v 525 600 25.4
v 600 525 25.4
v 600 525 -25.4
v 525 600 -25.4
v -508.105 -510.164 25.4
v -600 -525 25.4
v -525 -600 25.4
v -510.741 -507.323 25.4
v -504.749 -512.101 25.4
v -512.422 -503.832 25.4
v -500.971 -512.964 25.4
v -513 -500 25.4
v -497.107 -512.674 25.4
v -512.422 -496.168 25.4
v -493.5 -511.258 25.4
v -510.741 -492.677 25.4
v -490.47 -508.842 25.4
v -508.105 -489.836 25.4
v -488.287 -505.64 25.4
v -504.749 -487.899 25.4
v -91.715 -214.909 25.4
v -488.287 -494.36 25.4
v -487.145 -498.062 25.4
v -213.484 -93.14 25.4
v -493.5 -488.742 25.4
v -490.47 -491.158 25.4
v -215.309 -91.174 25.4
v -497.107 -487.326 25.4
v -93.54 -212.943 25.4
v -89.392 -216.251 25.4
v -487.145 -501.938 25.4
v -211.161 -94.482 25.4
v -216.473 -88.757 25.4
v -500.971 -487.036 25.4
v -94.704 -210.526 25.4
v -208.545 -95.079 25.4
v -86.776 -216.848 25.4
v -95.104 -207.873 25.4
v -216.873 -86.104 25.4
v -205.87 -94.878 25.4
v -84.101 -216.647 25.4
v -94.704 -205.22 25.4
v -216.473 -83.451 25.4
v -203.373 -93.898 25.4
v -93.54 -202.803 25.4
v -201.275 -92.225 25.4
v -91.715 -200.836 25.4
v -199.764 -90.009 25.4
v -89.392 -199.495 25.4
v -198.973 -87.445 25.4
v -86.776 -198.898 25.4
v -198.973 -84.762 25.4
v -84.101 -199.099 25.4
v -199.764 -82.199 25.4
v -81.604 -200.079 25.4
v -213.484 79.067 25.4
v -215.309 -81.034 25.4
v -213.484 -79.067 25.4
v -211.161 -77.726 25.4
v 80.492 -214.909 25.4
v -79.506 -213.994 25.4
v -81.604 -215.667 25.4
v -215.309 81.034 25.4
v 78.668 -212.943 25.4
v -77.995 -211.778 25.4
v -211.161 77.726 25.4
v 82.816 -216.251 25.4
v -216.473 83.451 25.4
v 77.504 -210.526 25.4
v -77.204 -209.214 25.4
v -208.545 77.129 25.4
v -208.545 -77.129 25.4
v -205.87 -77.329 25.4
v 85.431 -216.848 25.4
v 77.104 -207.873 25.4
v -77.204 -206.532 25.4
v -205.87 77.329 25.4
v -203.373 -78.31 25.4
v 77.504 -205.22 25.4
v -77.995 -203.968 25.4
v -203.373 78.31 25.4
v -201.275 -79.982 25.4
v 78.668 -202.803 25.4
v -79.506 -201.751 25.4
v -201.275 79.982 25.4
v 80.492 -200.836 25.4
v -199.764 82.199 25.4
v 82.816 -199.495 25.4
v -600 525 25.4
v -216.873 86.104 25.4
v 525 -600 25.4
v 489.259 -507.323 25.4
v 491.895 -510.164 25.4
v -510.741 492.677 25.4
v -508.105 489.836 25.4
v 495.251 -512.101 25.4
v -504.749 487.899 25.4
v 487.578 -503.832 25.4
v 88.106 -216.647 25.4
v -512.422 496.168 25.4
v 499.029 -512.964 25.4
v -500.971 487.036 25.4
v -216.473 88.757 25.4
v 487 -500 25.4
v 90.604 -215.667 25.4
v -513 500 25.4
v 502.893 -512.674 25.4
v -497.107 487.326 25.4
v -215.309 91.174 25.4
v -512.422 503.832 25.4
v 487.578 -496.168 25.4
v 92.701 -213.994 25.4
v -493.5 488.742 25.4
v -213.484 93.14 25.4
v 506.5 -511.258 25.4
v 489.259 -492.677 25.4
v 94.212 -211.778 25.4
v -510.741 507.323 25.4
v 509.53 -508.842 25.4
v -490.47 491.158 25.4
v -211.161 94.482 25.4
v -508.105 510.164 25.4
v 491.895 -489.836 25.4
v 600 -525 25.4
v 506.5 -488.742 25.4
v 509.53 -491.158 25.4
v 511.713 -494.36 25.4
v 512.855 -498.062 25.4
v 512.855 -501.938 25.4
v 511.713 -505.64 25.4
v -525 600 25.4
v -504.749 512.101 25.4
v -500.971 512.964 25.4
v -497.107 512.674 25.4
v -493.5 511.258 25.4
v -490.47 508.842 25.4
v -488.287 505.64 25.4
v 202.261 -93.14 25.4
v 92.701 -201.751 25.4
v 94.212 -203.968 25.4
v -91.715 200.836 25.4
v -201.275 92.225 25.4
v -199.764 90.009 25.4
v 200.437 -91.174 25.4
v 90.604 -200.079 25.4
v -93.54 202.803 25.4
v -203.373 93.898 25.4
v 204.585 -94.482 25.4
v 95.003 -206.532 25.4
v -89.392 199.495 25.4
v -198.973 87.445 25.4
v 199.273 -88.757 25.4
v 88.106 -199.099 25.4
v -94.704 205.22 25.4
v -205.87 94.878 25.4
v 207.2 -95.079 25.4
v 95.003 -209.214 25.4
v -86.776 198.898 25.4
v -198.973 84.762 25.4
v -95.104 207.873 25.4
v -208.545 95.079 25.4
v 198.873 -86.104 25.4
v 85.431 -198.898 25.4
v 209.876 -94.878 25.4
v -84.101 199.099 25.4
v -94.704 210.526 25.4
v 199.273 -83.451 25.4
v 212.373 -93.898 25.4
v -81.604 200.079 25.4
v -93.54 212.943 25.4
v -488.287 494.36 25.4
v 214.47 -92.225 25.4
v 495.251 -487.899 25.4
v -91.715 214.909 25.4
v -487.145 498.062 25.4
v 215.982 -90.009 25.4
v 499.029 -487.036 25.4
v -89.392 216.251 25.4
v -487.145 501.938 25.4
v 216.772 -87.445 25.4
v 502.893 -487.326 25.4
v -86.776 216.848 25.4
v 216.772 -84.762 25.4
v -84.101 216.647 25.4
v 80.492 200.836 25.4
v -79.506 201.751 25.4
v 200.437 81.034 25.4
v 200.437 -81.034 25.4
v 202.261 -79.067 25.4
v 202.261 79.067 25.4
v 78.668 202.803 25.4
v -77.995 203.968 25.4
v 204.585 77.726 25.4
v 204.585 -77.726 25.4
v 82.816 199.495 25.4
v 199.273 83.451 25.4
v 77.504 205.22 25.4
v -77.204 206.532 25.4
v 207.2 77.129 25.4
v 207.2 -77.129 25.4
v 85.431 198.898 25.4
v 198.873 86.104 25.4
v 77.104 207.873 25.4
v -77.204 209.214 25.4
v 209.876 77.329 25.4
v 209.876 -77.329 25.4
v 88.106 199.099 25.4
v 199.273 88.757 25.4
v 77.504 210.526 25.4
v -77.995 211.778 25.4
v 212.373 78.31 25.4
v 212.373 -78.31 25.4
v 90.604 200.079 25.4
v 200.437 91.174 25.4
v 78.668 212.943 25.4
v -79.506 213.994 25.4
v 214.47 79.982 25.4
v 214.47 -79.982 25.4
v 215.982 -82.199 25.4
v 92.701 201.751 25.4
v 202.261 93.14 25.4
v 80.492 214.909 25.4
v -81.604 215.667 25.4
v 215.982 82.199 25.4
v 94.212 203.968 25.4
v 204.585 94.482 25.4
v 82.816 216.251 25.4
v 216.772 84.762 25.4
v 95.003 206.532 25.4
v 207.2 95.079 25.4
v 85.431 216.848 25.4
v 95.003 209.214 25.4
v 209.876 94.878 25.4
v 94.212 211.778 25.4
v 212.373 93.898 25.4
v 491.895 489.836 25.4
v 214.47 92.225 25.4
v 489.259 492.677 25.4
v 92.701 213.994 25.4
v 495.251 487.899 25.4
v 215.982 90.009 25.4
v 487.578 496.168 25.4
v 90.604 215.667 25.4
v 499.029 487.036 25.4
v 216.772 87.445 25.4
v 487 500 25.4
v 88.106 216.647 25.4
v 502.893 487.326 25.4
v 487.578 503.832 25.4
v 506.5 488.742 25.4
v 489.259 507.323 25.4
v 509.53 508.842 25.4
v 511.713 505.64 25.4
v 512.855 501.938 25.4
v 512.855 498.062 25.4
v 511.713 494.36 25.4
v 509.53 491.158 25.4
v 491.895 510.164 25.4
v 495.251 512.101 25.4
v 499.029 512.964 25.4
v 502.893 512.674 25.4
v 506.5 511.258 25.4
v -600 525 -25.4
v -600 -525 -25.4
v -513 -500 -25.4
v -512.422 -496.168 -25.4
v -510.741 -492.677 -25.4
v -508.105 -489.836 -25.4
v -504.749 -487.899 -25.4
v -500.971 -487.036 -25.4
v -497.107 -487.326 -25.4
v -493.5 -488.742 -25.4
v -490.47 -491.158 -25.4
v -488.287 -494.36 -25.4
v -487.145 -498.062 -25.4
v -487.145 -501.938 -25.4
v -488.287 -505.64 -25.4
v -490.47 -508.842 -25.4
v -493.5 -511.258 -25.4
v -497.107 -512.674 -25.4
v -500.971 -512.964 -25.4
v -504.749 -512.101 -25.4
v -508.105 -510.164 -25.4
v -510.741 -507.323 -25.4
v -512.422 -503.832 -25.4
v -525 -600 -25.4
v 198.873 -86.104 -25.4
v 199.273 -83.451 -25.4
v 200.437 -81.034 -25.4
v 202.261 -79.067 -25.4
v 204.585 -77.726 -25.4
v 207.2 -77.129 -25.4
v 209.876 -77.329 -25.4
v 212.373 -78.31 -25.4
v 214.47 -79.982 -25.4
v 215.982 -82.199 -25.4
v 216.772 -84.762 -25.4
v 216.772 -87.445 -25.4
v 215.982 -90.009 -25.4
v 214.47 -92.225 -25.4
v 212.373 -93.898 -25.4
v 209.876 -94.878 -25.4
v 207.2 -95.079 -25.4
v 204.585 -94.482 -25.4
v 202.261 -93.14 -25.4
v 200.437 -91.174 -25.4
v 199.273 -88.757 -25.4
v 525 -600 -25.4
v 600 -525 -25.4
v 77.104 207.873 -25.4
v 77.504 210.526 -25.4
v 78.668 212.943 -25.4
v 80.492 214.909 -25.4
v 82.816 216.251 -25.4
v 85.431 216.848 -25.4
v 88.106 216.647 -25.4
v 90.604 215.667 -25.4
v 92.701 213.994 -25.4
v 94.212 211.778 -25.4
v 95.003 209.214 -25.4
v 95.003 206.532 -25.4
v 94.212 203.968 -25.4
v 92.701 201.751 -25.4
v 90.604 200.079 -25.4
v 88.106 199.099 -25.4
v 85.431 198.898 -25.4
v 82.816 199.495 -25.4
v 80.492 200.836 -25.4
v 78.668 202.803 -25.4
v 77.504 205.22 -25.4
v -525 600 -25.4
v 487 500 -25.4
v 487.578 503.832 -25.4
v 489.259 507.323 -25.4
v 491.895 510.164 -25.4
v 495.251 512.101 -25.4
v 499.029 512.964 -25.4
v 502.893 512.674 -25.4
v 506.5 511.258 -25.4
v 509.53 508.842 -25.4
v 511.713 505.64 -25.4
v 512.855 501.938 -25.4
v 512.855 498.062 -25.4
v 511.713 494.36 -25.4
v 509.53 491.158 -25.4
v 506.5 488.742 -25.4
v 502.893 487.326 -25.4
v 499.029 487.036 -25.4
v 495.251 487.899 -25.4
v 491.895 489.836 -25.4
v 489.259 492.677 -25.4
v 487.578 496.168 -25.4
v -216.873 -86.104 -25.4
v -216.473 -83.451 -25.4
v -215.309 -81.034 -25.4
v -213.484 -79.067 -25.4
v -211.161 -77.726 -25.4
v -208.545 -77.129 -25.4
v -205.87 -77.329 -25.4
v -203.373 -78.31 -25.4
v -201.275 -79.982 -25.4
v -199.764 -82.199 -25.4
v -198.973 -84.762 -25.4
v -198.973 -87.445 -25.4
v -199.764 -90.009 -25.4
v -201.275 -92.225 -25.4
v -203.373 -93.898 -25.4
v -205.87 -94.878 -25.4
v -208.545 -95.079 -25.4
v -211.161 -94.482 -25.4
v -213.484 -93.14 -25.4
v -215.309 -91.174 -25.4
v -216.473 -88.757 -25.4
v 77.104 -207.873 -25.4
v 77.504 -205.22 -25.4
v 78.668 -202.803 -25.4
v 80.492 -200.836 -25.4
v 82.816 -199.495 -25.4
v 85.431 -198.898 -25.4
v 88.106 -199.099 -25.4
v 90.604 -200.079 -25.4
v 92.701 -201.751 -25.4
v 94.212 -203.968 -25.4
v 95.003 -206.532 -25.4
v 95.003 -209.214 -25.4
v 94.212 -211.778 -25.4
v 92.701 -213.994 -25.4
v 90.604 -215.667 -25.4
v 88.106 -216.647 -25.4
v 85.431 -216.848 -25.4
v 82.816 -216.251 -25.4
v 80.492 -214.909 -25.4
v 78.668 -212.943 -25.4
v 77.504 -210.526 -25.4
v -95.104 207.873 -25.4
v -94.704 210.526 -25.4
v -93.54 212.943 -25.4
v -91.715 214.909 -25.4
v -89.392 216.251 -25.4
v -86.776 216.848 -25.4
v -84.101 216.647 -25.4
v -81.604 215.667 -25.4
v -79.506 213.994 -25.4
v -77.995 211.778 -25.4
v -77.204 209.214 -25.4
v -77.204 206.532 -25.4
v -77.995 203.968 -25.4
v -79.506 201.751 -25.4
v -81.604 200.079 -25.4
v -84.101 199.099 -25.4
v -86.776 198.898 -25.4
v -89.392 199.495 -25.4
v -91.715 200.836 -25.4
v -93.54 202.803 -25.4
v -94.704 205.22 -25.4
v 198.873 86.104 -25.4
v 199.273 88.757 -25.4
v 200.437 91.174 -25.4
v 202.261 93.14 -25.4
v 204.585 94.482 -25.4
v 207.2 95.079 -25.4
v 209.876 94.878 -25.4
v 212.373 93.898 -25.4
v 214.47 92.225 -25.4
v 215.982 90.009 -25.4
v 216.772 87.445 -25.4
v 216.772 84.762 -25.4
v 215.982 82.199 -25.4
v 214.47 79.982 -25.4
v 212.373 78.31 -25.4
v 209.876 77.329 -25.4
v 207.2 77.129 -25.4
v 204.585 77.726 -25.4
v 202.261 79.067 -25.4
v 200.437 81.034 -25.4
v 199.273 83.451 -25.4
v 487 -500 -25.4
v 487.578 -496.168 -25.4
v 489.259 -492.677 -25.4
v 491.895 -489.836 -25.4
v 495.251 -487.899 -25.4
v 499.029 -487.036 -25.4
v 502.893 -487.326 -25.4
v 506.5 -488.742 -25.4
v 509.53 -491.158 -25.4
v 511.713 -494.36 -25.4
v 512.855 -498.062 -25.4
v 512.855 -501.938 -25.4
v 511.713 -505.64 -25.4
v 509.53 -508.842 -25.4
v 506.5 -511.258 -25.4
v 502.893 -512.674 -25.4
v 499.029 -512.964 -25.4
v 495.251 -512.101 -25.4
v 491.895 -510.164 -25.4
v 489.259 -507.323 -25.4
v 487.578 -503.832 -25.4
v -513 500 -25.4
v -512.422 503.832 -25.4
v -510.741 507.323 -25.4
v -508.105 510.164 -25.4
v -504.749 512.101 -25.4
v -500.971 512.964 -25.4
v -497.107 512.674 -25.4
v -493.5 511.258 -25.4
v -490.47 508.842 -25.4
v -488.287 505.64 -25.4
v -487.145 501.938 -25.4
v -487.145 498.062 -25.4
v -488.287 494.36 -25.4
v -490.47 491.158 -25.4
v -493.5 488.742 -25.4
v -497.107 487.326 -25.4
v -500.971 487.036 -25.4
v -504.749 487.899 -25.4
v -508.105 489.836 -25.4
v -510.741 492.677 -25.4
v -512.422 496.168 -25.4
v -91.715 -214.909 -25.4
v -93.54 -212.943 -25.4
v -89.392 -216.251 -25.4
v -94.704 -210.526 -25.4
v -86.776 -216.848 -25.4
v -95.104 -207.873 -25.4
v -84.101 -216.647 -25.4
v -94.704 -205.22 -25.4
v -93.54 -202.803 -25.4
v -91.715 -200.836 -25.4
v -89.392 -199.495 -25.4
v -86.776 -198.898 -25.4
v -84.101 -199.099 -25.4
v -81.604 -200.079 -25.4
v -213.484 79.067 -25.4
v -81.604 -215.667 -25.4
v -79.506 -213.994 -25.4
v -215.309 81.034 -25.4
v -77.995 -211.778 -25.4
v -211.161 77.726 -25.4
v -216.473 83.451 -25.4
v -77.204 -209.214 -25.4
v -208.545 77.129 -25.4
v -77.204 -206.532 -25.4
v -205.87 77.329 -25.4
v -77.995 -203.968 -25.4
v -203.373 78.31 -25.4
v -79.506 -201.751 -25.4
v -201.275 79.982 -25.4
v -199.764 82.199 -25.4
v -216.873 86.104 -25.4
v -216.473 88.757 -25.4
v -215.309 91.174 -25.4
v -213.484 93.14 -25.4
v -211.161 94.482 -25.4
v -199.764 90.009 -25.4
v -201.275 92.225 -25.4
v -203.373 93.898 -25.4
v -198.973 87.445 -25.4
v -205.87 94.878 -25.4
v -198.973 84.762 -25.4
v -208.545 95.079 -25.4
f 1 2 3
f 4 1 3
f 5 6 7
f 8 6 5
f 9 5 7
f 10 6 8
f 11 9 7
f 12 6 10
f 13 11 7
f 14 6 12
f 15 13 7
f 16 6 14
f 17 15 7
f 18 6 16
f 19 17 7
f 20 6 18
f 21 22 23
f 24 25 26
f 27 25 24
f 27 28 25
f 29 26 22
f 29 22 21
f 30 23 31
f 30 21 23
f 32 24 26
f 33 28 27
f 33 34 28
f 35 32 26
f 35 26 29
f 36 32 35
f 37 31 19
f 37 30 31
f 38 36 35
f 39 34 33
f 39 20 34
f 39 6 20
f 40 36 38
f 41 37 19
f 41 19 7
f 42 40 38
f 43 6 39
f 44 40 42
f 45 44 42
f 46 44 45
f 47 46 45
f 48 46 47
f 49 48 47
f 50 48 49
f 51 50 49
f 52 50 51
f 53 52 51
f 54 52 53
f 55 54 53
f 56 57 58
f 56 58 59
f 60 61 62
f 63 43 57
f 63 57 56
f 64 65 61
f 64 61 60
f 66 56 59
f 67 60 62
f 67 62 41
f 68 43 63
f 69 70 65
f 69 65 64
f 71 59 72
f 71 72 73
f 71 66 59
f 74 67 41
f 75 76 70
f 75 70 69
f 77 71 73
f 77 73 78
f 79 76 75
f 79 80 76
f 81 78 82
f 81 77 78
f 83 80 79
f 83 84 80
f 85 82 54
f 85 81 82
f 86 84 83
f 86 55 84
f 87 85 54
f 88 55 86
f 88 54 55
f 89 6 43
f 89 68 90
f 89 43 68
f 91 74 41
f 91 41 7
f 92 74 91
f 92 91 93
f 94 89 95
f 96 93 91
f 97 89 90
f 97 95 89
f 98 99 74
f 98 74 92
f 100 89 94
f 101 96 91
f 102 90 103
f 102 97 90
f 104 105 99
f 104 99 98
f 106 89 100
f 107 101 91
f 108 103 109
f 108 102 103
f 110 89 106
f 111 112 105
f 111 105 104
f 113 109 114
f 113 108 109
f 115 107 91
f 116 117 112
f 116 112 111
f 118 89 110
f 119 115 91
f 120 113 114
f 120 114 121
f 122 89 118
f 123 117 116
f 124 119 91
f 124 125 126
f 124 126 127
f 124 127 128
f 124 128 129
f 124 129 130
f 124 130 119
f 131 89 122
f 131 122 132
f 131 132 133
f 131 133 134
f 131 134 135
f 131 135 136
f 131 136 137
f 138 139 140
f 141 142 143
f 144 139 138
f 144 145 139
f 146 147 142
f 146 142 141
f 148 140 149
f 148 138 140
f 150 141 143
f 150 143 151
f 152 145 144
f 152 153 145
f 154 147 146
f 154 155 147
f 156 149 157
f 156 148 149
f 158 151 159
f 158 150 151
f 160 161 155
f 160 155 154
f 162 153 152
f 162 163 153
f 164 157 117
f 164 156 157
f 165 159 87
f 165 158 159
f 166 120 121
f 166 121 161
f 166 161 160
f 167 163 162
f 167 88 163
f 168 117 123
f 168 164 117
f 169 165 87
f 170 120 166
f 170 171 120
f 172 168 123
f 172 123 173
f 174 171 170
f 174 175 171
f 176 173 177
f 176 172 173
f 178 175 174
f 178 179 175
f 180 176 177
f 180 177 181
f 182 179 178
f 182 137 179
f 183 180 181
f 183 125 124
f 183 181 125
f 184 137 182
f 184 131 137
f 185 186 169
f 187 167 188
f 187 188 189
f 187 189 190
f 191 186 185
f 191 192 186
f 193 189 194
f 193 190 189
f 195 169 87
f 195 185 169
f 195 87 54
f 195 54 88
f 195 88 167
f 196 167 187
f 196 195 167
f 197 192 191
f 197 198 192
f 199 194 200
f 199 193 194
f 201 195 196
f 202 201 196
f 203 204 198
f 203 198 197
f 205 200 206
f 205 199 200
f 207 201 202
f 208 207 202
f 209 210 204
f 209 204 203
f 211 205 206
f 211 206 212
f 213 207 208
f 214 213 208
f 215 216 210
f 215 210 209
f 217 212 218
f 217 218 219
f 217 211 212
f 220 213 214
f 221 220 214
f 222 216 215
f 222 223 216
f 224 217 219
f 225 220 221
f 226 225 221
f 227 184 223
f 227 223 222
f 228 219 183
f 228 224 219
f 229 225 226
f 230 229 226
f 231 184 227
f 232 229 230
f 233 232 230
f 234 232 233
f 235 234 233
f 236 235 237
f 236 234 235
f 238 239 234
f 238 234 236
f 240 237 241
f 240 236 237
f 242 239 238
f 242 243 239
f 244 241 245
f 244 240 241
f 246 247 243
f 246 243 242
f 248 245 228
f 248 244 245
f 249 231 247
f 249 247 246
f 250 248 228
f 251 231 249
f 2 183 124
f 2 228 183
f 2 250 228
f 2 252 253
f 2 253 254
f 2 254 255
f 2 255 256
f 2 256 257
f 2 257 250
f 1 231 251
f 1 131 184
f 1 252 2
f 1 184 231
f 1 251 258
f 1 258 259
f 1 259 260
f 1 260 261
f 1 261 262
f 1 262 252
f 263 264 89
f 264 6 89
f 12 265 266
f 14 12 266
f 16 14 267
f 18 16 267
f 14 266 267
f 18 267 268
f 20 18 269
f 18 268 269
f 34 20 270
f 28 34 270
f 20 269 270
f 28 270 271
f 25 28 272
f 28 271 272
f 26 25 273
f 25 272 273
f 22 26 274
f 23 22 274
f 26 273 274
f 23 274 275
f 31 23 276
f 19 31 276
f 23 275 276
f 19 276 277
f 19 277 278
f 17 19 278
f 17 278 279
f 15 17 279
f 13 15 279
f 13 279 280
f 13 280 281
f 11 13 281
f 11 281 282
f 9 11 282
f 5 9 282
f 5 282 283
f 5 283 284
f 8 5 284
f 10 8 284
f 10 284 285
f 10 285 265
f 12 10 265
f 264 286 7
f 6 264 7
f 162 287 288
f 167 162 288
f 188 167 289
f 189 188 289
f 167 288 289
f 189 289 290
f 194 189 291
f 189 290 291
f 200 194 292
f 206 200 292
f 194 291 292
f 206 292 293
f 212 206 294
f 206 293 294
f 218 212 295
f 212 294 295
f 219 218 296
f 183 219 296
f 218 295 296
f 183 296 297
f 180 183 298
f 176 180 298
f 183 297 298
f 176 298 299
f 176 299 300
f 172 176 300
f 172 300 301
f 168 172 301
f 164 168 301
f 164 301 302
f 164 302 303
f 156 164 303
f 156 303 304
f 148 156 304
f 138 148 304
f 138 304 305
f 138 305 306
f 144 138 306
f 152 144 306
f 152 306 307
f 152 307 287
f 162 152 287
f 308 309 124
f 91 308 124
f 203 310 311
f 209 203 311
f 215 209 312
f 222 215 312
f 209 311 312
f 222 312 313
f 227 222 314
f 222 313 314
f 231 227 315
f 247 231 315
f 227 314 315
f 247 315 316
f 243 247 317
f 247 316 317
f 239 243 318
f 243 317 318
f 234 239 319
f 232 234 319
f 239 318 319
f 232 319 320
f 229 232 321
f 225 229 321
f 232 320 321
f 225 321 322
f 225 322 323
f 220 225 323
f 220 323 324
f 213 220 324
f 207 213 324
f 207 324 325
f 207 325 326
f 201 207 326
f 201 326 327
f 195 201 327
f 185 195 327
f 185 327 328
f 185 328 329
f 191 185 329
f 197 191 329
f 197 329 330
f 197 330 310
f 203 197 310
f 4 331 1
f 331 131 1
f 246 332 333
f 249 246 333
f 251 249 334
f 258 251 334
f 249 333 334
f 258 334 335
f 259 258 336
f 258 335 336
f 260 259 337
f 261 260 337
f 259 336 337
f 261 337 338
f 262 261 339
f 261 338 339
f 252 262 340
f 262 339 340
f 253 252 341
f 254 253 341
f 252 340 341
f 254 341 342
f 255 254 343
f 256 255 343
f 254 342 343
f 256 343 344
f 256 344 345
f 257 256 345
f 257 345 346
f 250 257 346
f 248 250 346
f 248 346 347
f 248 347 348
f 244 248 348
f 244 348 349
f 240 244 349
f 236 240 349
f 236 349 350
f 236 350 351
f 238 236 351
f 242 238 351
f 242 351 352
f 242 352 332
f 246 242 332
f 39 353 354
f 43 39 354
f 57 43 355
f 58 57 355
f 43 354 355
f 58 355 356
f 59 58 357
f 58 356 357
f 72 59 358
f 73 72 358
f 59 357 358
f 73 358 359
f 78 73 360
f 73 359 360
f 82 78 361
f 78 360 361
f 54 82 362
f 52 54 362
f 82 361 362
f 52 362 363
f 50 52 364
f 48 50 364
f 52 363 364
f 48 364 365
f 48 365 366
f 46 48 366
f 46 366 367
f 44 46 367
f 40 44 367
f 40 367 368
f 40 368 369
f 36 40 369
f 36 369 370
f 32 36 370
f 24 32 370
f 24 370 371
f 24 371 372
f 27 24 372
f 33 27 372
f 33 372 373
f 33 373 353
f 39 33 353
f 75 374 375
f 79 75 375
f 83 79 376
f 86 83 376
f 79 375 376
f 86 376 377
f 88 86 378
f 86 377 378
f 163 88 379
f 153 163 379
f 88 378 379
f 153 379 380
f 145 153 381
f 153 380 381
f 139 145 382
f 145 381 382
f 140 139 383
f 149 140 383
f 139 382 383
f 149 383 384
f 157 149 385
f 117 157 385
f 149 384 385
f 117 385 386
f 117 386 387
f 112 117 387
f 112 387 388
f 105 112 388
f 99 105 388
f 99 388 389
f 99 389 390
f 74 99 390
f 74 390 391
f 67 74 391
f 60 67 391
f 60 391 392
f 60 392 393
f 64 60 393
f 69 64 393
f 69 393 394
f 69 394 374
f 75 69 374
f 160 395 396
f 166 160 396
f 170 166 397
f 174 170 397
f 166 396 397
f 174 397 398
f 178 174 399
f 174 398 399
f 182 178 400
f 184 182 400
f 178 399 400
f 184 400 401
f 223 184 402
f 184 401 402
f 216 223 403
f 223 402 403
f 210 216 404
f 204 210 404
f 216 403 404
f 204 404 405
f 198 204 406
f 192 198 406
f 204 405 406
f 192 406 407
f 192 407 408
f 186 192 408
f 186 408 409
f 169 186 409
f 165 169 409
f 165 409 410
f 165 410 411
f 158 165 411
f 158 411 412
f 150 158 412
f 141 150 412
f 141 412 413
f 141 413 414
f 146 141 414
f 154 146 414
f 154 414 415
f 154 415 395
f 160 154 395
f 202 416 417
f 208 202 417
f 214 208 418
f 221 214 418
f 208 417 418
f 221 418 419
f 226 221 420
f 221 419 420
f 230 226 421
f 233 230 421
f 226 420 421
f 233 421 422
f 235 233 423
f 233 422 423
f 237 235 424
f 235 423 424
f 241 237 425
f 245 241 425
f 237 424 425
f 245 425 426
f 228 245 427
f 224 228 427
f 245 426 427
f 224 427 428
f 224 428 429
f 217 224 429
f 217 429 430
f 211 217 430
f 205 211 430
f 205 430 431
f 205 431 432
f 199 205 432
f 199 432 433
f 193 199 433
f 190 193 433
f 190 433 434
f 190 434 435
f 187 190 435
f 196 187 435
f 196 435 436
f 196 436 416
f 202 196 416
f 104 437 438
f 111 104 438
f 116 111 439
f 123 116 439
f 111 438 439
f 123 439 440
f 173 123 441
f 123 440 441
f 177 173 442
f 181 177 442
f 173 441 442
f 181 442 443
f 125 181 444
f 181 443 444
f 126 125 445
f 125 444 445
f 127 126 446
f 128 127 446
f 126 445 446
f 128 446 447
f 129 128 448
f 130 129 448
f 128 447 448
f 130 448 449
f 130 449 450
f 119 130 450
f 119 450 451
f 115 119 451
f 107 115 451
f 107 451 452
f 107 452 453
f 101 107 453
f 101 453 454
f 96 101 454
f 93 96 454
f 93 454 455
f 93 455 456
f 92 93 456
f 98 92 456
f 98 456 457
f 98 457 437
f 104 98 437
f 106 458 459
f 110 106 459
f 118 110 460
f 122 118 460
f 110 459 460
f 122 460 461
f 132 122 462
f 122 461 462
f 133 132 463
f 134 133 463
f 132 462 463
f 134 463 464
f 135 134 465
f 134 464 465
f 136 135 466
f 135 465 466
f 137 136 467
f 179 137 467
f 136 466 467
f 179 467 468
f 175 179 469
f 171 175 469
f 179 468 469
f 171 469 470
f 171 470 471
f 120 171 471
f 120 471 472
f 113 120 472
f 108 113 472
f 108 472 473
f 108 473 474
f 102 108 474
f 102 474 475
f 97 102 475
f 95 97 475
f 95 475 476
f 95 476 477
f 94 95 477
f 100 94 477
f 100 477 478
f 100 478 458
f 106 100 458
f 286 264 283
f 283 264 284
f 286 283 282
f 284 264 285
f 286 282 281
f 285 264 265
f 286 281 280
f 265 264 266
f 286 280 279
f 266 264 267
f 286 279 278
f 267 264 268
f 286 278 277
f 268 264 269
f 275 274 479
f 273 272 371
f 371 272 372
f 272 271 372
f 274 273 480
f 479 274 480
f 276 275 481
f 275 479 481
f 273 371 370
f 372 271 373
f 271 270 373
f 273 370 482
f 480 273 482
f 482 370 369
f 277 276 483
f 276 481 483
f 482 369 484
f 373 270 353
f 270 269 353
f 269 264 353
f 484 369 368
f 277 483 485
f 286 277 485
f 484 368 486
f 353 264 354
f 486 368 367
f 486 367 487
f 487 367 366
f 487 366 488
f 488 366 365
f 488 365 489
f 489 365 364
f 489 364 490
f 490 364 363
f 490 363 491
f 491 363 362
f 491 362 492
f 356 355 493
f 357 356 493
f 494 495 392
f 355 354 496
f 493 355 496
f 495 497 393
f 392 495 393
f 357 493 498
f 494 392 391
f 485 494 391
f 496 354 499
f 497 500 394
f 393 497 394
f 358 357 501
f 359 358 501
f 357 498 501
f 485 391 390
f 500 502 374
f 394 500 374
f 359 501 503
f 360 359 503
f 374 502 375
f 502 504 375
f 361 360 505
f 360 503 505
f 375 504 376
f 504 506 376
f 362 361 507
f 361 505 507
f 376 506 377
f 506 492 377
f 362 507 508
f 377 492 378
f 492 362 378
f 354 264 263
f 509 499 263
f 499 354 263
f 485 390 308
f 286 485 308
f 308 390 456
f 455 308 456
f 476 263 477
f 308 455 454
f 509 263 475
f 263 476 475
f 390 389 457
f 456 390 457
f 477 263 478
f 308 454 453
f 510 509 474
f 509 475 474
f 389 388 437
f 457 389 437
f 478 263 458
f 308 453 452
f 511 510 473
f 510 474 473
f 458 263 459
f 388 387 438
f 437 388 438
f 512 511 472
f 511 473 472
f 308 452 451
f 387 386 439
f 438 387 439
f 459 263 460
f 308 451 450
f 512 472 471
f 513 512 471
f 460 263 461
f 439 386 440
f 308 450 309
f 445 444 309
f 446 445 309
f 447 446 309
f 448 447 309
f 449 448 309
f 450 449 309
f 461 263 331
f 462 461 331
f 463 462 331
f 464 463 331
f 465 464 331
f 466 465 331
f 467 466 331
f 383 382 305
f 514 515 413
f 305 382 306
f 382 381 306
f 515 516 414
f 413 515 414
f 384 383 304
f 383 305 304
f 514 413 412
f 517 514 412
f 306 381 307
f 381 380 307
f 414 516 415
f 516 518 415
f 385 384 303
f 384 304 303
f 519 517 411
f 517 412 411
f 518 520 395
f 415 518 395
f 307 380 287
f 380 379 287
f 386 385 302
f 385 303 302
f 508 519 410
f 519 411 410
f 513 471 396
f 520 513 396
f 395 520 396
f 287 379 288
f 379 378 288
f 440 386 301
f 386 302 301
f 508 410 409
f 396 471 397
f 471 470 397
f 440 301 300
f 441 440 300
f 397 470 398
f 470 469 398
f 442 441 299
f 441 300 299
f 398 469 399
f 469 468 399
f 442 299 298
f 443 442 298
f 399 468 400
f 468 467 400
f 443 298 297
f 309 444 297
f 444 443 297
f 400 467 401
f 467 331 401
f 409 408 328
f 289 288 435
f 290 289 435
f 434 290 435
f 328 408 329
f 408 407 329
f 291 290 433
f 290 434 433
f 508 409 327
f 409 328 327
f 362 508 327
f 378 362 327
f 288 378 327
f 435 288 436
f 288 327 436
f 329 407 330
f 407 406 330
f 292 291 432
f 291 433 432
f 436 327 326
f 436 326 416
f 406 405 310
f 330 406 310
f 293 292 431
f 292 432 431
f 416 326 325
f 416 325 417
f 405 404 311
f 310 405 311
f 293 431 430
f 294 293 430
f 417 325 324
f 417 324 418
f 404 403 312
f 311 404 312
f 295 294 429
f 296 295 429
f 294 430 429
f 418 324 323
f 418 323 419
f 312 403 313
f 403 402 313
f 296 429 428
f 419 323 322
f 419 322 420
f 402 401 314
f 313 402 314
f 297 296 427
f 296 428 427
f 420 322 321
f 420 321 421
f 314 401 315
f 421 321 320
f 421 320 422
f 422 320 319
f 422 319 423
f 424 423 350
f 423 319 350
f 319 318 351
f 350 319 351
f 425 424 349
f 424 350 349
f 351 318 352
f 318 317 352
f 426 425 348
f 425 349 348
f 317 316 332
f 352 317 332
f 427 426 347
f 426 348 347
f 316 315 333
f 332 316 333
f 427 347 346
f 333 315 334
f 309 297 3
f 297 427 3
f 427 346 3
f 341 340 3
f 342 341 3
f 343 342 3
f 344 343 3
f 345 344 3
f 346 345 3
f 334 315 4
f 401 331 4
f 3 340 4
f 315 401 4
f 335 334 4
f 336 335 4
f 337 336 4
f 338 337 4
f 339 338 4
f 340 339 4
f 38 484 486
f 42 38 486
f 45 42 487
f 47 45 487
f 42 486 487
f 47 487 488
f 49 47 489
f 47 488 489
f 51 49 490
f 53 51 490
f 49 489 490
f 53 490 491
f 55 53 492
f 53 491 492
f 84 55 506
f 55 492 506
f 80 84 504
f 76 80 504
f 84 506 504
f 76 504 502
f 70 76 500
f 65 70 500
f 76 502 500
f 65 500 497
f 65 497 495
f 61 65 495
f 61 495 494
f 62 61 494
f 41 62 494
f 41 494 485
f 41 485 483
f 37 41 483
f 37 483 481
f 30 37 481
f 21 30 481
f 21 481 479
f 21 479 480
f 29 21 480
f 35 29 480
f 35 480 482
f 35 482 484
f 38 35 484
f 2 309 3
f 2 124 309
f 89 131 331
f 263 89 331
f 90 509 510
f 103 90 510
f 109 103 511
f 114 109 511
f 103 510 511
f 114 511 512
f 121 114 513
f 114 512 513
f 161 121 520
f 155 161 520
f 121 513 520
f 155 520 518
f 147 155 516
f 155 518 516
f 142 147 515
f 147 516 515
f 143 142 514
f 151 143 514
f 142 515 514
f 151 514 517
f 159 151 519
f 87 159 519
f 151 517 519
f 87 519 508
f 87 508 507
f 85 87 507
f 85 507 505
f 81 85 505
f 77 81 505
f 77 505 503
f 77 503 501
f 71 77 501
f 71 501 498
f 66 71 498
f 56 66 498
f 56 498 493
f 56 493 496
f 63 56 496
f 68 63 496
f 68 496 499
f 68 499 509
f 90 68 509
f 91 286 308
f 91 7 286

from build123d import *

# Parameters (mm, degrees)
F0_W     = 1200
F0_H     = 1200
F1_DEPTH = 25.4
F3_D     = 18
F4_SIZE  = 75
F6_D     = 26


with BuildPart() as f1:
    # F0 (on Top) → F1 (new body, symmetric)
    with BuildSketch(Plane.XY):
        Rectangle(F0_W, F0_H)
    extrude(amount=F1_DEPTH, both=True)

    # F3 (through all)
    with Locations(Plane.XY.offset(25.4)):
        with Locations((-86.1037722821, 207.872894815), (86.1037722821, 207.872894815), (207.872894815, 86.1037722821), (207.872894815, -86.1037722821), (86.1037722821, -207.872894815), (-86.1037722821, -207.872894815), (-207.872894815, -86.1037722821), (-207.872894815, 86.1037722821)):
            Hole(F3_D / 2)

    # F4
    f4_edges = [f1.edges().sort_by_distance(p)[0] for p in [
        (-600, 600, 0),
        (600, 600, 0),
        (600, -600, 0),
        (-600, -600, 0),
    ]]
    chamfer(f4_edges, length=F4_SIZE)

    # F6 (through all)
    with Locations(Plane.XY.offset(25.4)):
        with Locations((500, 500), (500, -500), (-500, 500), (-500, -500)):
            Hole(F6_D / 2)


solid = f1.part
